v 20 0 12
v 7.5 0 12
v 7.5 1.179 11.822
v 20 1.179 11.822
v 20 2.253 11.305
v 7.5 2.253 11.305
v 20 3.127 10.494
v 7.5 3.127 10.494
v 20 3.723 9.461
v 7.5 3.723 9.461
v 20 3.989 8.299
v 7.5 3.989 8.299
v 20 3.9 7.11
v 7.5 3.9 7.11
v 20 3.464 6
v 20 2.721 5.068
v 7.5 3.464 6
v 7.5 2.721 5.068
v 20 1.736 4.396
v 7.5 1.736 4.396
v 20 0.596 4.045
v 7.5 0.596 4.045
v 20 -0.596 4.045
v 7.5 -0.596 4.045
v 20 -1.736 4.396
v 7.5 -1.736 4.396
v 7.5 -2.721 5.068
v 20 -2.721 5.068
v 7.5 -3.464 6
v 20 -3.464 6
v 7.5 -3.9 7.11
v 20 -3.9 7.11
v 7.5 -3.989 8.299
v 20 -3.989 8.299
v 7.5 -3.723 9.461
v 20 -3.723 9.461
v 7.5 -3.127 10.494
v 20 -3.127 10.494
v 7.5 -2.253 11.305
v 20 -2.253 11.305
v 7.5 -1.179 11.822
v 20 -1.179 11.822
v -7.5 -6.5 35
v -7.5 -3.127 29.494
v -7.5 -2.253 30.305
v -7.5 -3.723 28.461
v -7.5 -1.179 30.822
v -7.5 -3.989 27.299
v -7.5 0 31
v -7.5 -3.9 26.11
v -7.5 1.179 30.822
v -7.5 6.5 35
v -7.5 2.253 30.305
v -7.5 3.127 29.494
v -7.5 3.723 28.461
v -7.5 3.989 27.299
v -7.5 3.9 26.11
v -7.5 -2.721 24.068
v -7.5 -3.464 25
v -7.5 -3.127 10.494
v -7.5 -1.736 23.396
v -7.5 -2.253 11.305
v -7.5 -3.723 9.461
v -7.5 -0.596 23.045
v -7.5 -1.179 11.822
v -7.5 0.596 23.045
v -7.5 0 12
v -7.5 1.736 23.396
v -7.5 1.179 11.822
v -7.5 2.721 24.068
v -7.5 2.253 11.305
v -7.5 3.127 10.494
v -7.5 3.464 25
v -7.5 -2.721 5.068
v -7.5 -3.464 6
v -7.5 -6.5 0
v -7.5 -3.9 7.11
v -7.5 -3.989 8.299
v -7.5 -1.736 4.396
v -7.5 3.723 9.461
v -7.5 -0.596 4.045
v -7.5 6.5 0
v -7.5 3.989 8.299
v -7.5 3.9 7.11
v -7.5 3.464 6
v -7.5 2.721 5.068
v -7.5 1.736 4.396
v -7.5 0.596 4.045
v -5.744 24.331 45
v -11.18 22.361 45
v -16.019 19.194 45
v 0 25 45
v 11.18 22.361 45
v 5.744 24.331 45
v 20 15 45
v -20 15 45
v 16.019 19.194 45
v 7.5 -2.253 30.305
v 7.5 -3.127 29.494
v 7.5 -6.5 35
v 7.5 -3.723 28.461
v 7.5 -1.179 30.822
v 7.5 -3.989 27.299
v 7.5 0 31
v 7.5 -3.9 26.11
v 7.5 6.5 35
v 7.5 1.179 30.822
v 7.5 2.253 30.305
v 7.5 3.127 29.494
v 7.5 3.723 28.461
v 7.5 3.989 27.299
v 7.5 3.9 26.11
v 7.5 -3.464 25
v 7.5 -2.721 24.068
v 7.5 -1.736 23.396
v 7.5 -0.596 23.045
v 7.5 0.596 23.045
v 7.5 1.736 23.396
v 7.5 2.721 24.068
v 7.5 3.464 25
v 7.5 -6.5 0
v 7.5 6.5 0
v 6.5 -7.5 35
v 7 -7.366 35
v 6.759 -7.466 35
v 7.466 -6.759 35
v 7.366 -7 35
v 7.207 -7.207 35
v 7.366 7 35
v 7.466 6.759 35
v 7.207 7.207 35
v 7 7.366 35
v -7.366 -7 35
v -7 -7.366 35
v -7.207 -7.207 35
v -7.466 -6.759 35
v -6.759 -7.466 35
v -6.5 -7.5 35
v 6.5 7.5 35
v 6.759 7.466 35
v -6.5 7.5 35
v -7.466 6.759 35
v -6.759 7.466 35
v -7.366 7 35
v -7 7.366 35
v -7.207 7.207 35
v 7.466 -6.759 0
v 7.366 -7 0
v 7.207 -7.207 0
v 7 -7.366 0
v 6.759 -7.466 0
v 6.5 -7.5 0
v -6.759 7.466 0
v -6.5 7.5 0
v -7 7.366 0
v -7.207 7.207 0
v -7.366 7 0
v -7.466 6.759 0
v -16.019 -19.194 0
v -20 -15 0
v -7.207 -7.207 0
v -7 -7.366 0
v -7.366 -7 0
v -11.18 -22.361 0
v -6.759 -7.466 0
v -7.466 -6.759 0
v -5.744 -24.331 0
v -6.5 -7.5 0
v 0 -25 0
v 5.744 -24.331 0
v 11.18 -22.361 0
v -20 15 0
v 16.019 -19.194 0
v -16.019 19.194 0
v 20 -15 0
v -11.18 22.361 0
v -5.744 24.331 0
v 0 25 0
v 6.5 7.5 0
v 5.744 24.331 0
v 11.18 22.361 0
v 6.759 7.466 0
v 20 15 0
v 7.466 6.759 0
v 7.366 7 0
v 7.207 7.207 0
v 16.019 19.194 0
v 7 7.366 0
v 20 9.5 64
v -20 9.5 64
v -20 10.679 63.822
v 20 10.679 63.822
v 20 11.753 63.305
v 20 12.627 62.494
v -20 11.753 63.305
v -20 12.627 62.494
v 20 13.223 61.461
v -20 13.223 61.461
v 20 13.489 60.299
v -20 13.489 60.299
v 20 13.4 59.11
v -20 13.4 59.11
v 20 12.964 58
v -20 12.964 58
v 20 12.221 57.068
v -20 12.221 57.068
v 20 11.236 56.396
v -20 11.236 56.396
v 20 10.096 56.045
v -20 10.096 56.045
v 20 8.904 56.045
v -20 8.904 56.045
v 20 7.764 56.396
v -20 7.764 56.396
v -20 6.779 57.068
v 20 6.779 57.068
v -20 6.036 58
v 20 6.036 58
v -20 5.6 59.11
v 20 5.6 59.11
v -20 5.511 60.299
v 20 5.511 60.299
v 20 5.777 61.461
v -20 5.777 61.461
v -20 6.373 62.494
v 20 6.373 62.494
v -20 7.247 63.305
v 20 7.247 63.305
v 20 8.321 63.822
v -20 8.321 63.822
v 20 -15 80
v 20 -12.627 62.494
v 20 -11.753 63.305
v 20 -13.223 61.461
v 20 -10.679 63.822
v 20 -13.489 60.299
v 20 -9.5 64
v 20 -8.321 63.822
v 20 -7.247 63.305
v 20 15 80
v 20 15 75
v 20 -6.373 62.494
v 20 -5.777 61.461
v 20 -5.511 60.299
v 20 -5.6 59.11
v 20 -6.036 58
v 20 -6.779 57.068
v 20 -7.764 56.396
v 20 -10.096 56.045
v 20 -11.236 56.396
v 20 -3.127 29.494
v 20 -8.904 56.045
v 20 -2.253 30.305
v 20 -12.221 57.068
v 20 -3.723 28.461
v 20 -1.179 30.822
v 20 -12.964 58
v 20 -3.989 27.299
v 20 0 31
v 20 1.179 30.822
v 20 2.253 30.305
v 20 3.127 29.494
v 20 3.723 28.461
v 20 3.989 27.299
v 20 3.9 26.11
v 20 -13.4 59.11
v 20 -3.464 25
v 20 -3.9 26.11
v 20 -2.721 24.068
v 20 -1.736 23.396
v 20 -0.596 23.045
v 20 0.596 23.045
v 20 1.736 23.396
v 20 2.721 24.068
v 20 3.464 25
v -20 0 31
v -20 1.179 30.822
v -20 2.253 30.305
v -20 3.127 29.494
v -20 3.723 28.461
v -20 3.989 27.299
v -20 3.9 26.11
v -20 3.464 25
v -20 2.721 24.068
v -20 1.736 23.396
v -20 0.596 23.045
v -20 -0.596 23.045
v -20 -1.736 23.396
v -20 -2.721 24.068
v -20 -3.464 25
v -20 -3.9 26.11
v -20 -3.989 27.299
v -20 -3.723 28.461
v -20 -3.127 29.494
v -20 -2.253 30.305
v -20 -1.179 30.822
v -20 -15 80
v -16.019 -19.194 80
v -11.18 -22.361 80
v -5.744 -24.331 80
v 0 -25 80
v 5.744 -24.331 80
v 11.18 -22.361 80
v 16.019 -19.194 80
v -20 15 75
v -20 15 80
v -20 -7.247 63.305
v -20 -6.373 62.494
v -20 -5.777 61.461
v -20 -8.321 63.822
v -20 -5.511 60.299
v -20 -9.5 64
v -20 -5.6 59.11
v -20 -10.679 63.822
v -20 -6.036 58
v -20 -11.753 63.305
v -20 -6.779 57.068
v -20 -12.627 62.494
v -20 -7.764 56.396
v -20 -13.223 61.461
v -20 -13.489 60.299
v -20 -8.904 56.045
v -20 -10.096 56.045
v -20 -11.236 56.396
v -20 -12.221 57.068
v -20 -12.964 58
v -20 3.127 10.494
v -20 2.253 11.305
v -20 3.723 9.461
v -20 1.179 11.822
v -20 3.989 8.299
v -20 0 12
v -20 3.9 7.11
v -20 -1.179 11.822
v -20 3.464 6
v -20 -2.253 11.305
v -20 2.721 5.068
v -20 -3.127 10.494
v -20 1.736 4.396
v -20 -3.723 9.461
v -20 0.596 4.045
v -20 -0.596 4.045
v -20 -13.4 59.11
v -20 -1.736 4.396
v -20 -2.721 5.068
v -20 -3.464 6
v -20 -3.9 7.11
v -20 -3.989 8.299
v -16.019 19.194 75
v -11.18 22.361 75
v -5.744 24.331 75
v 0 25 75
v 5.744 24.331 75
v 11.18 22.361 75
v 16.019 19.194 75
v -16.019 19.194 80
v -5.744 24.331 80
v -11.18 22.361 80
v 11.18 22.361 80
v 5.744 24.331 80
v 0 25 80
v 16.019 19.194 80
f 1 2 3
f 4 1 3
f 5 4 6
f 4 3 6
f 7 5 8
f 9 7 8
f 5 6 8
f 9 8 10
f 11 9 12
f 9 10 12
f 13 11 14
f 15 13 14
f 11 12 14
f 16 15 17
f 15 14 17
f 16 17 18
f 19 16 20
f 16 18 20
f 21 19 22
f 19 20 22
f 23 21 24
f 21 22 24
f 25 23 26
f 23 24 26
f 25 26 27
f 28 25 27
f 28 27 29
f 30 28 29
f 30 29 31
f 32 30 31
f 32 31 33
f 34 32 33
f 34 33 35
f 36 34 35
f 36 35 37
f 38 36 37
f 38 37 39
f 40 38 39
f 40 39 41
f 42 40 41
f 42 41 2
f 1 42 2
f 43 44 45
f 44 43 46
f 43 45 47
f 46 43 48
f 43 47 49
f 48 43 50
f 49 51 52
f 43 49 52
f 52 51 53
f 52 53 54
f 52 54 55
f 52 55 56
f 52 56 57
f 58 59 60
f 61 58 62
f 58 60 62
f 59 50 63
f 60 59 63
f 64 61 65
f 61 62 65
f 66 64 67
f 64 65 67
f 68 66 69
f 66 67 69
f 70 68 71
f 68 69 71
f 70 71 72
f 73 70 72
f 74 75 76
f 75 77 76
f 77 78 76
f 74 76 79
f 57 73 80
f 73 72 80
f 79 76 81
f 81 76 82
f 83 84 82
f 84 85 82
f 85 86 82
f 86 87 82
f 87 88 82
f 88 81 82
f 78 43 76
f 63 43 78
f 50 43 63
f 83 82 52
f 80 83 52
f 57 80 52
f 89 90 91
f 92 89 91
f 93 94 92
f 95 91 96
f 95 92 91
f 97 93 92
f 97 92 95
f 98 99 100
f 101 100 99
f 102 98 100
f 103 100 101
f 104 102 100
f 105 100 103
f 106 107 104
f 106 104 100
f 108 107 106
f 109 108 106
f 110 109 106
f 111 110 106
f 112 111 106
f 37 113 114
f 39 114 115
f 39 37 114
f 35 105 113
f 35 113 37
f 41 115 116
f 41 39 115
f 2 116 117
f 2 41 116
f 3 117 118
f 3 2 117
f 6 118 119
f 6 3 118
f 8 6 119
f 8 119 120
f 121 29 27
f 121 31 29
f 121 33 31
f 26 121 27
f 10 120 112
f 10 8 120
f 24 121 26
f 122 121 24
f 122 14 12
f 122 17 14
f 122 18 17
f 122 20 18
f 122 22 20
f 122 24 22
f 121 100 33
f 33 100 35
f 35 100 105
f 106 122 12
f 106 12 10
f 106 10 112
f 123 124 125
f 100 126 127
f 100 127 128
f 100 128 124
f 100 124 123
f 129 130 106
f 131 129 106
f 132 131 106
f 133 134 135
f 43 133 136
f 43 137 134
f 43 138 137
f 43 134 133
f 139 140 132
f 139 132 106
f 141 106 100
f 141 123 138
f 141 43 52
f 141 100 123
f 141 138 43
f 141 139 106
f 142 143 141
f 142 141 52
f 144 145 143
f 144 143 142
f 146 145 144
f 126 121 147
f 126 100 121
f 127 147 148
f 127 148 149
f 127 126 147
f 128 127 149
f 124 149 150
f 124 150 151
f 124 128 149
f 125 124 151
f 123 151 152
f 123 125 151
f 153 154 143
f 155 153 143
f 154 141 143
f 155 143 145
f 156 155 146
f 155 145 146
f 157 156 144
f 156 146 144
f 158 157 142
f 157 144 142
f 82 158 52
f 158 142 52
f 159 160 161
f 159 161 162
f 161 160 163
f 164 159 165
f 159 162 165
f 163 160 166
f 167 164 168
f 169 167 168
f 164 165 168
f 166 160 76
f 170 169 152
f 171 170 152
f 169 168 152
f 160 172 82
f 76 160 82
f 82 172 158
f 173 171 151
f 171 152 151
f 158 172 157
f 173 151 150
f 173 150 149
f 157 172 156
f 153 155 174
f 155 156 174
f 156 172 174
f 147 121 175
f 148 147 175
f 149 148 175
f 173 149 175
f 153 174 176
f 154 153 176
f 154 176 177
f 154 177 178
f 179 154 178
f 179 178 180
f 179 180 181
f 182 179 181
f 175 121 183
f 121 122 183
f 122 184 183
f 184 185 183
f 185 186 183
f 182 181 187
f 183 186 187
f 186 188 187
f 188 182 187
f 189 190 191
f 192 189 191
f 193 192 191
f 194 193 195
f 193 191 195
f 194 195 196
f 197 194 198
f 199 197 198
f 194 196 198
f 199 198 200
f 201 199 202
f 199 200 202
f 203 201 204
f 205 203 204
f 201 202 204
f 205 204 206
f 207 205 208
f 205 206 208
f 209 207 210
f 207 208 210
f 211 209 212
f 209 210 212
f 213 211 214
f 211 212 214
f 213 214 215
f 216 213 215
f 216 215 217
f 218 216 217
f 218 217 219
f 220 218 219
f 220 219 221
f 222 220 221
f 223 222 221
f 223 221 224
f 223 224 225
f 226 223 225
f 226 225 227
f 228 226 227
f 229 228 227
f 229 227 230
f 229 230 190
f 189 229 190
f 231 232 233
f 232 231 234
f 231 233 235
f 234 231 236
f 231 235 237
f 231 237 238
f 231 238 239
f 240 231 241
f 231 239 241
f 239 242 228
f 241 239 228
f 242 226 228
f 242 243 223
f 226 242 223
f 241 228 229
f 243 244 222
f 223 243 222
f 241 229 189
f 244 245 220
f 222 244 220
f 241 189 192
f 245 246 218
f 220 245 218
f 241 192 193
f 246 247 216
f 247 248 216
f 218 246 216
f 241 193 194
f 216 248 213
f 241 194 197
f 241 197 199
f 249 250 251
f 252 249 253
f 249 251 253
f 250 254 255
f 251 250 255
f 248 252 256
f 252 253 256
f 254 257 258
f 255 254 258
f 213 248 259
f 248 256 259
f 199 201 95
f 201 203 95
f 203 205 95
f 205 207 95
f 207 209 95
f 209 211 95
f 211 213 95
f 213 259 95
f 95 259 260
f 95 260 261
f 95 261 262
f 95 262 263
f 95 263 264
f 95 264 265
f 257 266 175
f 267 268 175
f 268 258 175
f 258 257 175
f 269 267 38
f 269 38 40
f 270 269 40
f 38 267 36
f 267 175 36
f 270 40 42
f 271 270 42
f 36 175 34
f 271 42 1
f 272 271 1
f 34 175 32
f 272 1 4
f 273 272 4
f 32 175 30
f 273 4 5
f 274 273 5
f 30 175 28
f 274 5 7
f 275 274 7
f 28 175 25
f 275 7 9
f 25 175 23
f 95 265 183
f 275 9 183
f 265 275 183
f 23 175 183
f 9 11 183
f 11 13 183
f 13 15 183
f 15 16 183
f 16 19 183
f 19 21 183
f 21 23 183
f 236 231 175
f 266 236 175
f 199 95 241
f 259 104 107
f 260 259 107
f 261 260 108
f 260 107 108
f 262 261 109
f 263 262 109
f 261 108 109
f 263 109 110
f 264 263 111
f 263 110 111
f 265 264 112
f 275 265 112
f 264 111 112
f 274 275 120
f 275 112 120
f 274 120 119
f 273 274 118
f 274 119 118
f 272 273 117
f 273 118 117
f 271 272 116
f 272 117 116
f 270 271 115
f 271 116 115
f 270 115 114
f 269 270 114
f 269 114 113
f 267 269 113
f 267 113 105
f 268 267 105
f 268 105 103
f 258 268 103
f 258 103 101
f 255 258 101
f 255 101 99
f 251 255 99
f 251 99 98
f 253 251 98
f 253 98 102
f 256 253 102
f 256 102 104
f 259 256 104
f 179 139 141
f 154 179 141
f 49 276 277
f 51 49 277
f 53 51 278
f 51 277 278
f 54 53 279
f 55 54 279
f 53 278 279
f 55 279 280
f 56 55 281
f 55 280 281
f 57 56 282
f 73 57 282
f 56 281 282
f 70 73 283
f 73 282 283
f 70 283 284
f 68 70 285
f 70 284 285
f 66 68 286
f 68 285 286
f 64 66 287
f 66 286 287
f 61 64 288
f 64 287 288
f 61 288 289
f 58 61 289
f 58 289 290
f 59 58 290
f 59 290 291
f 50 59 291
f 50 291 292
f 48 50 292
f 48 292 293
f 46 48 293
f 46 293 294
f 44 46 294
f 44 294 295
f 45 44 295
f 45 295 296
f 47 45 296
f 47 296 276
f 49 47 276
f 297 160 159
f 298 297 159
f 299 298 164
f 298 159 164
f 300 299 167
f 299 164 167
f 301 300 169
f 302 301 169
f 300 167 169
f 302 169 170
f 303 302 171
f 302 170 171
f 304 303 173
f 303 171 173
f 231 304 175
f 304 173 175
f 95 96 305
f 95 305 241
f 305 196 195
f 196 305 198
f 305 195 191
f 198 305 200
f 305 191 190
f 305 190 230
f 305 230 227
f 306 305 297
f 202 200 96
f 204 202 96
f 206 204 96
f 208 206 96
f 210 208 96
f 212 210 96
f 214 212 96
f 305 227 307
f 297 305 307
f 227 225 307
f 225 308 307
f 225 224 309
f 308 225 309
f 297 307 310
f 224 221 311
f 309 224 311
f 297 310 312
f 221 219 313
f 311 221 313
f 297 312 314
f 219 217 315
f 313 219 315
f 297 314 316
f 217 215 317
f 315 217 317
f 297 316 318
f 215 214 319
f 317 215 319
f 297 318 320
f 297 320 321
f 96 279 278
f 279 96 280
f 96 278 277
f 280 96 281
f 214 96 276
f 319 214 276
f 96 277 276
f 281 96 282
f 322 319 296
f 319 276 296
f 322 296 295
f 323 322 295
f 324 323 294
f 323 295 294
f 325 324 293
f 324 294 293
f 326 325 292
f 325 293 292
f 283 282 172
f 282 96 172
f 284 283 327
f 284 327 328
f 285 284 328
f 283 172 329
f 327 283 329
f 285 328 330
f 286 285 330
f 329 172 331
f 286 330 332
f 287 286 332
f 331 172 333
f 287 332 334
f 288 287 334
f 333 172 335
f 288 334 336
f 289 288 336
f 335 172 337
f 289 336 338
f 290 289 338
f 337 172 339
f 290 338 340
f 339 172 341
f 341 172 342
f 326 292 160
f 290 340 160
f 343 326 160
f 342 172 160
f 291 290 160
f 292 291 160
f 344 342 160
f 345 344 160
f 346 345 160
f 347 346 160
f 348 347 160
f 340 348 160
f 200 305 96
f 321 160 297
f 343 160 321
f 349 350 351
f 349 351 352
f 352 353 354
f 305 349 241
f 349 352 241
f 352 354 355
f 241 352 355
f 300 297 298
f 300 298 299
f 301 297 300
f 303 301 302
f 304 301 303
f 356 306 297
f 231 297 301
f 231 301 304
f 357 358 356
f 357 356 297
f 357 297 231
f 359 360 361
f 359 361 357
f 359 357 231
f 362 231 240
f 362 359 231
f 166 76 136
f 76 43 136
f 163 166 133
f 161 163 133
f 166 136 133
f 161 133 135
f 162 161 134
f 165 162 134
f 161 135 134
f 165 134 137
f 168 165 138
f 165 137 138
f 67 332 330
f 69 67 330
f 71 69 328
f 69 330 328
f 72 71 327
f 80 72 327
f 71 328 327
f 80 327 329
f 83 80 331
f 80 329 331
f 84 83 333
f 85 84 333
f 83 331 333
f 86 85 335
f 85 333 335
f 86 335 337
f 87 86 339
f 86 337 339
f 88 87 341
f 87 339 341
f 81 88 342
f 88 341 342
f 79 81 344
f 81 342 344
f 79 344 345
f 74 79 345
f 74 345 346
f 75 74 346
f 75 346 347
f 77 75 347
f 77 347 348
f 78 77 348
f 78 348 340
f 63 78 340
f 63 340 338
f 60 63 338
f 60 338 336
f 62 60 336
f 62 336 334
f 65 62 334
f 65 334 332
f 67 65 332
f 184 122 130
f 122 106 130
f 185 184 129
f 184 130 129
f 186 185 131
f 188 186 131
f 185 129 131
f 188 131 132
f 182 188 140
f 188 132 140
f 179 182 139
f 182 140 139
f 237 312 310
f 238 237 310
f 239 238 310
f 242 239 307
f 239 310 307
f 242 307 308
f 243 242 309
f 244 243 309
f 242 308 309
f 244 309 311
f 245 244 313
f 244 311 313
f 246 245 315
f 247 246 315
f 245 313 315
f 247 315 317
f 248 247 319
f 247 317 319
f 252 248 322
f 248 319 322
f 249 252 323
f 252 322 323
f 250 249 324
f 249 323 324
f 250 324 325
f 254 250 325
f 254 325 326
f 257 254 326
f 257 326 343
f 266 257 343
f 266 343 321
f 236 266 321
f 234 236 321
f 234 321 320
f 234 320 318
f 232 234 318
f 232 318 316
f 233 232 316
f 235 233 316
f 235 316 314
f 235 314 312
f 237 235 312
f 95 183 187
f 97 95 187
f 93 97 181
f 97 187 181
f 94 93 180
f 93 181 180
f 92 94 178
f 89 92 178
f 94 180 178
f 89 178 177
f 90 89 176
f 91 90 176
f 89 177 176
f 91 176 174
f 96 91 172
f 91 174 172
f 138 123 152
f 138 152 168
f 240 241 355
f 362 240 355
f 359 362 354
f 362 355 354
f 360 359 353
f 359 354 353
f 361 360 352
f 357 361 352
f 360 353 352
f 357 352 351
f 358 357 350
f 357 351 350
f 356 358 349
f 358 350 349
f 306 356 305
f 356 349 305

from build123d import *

# Parameters (mm, degrees)
EXTRUDE_1_DEPTH     = 80
SKETCH_2_W          = 15
SKETCH_2_H          = 15
CUT_EXTRUDE_1_DEPTH = 35
SKETCH_3_R          = 4
CUT_EXTRUDE_2_DEPTH = 93.870878105
CUT_EXTRUDE_START   = -35
CUT_EXTRUDE_4_DEPTH = 35
FILLET_1_R          = 1
EXTRUDE_START       = -5
EXTRUDE_2_DEPTH     = 5


with BuildPart() as part:
    # 草图1 → 凸台-拉伸1 (new body)
    with BuildSketch(Plane.XY):
        with BuildLine():
            Line((-20, 15), (-20, -15))
            ThreePointArc((-20, -15), (0, -25), (20, -15))
            Line((20, -15), (20, 15))
            ThreePointArc((20, 15), (0, 25), (-20, 15))
        make_face()
    extrude(amount=EXTRUDE_1_DEPTH)

    # 草图2 → 切除-拉伸1 (cut)
    with BuildSketch(Plane(origin=(0, 0, 0), x_dir=(-1, 0, 0), z_dir=(0, 0, -1))):
        Rectangle(SKETCH_2_W, SKETCH_2_H)
    extrude(amount=-CUT_EXTRUDE_1_DEPTH, mode=Mode.SUBTRACT)

    # 草图3 → 切除-拉伸2 (cut, through all)
    with BuildSketch(Plane.ZY.offset(20)):
        with Locations((8, 0)):
            Circle(SKETCH_3_R)
        with Locations((27, 0)):
            Circle(SKETCH_3_R)
        with Locations((60, 9.5)):
            Circle(SKETCH_3_R)
        with Locations((60, -9.5)):
            Circle(SKETCH_3_R)
    extrude(amount=-CUT_EXTRUDE_2_DEPTH, mode=Mode.SUBTRACT)

    # 草图6 → 切除-拉伸4 (cut)
    with BuildSketch(Plane.XY.offset(80).offset(CUT_EXTRUDE_START)):
        with BuildLine():
            Line((-20, 15), (20, 15))
            ThreePointArc((20, 15), (0, 25), (-20, 15))
        make_face()
    extrude(amount=CUT_EXTRUDE_4_DEPTH, mode=Mode.SUBTRACT)

    # 圆角1
    fillet_1_edges = [part.edges().sort_by_distance(p)[0] for p in [
        (7.5, -7.5, 17.5),
        (7.5, 7.5, 17.5),
        (-7.5, 7.5, 17.5),
        (-7.5, -7.5, 17.5),
    ]]
    fillet(fillet_1_edges, radius=FILLET_1_R)

    # 草图6<2> → 凸台-拉伸2 (add)
    with BuildSketch(Plane.XY.offset(80).offset(EXTRUDE_START)):
        with BuildLine():
            Line((-20, 15), (20, 15))
            ThreePointArc((20, 15), (0, 25), (-20, 15))
        make_face()
    extrude(amount=EXTRUDE_2_DEPTH)


solid = part.part
